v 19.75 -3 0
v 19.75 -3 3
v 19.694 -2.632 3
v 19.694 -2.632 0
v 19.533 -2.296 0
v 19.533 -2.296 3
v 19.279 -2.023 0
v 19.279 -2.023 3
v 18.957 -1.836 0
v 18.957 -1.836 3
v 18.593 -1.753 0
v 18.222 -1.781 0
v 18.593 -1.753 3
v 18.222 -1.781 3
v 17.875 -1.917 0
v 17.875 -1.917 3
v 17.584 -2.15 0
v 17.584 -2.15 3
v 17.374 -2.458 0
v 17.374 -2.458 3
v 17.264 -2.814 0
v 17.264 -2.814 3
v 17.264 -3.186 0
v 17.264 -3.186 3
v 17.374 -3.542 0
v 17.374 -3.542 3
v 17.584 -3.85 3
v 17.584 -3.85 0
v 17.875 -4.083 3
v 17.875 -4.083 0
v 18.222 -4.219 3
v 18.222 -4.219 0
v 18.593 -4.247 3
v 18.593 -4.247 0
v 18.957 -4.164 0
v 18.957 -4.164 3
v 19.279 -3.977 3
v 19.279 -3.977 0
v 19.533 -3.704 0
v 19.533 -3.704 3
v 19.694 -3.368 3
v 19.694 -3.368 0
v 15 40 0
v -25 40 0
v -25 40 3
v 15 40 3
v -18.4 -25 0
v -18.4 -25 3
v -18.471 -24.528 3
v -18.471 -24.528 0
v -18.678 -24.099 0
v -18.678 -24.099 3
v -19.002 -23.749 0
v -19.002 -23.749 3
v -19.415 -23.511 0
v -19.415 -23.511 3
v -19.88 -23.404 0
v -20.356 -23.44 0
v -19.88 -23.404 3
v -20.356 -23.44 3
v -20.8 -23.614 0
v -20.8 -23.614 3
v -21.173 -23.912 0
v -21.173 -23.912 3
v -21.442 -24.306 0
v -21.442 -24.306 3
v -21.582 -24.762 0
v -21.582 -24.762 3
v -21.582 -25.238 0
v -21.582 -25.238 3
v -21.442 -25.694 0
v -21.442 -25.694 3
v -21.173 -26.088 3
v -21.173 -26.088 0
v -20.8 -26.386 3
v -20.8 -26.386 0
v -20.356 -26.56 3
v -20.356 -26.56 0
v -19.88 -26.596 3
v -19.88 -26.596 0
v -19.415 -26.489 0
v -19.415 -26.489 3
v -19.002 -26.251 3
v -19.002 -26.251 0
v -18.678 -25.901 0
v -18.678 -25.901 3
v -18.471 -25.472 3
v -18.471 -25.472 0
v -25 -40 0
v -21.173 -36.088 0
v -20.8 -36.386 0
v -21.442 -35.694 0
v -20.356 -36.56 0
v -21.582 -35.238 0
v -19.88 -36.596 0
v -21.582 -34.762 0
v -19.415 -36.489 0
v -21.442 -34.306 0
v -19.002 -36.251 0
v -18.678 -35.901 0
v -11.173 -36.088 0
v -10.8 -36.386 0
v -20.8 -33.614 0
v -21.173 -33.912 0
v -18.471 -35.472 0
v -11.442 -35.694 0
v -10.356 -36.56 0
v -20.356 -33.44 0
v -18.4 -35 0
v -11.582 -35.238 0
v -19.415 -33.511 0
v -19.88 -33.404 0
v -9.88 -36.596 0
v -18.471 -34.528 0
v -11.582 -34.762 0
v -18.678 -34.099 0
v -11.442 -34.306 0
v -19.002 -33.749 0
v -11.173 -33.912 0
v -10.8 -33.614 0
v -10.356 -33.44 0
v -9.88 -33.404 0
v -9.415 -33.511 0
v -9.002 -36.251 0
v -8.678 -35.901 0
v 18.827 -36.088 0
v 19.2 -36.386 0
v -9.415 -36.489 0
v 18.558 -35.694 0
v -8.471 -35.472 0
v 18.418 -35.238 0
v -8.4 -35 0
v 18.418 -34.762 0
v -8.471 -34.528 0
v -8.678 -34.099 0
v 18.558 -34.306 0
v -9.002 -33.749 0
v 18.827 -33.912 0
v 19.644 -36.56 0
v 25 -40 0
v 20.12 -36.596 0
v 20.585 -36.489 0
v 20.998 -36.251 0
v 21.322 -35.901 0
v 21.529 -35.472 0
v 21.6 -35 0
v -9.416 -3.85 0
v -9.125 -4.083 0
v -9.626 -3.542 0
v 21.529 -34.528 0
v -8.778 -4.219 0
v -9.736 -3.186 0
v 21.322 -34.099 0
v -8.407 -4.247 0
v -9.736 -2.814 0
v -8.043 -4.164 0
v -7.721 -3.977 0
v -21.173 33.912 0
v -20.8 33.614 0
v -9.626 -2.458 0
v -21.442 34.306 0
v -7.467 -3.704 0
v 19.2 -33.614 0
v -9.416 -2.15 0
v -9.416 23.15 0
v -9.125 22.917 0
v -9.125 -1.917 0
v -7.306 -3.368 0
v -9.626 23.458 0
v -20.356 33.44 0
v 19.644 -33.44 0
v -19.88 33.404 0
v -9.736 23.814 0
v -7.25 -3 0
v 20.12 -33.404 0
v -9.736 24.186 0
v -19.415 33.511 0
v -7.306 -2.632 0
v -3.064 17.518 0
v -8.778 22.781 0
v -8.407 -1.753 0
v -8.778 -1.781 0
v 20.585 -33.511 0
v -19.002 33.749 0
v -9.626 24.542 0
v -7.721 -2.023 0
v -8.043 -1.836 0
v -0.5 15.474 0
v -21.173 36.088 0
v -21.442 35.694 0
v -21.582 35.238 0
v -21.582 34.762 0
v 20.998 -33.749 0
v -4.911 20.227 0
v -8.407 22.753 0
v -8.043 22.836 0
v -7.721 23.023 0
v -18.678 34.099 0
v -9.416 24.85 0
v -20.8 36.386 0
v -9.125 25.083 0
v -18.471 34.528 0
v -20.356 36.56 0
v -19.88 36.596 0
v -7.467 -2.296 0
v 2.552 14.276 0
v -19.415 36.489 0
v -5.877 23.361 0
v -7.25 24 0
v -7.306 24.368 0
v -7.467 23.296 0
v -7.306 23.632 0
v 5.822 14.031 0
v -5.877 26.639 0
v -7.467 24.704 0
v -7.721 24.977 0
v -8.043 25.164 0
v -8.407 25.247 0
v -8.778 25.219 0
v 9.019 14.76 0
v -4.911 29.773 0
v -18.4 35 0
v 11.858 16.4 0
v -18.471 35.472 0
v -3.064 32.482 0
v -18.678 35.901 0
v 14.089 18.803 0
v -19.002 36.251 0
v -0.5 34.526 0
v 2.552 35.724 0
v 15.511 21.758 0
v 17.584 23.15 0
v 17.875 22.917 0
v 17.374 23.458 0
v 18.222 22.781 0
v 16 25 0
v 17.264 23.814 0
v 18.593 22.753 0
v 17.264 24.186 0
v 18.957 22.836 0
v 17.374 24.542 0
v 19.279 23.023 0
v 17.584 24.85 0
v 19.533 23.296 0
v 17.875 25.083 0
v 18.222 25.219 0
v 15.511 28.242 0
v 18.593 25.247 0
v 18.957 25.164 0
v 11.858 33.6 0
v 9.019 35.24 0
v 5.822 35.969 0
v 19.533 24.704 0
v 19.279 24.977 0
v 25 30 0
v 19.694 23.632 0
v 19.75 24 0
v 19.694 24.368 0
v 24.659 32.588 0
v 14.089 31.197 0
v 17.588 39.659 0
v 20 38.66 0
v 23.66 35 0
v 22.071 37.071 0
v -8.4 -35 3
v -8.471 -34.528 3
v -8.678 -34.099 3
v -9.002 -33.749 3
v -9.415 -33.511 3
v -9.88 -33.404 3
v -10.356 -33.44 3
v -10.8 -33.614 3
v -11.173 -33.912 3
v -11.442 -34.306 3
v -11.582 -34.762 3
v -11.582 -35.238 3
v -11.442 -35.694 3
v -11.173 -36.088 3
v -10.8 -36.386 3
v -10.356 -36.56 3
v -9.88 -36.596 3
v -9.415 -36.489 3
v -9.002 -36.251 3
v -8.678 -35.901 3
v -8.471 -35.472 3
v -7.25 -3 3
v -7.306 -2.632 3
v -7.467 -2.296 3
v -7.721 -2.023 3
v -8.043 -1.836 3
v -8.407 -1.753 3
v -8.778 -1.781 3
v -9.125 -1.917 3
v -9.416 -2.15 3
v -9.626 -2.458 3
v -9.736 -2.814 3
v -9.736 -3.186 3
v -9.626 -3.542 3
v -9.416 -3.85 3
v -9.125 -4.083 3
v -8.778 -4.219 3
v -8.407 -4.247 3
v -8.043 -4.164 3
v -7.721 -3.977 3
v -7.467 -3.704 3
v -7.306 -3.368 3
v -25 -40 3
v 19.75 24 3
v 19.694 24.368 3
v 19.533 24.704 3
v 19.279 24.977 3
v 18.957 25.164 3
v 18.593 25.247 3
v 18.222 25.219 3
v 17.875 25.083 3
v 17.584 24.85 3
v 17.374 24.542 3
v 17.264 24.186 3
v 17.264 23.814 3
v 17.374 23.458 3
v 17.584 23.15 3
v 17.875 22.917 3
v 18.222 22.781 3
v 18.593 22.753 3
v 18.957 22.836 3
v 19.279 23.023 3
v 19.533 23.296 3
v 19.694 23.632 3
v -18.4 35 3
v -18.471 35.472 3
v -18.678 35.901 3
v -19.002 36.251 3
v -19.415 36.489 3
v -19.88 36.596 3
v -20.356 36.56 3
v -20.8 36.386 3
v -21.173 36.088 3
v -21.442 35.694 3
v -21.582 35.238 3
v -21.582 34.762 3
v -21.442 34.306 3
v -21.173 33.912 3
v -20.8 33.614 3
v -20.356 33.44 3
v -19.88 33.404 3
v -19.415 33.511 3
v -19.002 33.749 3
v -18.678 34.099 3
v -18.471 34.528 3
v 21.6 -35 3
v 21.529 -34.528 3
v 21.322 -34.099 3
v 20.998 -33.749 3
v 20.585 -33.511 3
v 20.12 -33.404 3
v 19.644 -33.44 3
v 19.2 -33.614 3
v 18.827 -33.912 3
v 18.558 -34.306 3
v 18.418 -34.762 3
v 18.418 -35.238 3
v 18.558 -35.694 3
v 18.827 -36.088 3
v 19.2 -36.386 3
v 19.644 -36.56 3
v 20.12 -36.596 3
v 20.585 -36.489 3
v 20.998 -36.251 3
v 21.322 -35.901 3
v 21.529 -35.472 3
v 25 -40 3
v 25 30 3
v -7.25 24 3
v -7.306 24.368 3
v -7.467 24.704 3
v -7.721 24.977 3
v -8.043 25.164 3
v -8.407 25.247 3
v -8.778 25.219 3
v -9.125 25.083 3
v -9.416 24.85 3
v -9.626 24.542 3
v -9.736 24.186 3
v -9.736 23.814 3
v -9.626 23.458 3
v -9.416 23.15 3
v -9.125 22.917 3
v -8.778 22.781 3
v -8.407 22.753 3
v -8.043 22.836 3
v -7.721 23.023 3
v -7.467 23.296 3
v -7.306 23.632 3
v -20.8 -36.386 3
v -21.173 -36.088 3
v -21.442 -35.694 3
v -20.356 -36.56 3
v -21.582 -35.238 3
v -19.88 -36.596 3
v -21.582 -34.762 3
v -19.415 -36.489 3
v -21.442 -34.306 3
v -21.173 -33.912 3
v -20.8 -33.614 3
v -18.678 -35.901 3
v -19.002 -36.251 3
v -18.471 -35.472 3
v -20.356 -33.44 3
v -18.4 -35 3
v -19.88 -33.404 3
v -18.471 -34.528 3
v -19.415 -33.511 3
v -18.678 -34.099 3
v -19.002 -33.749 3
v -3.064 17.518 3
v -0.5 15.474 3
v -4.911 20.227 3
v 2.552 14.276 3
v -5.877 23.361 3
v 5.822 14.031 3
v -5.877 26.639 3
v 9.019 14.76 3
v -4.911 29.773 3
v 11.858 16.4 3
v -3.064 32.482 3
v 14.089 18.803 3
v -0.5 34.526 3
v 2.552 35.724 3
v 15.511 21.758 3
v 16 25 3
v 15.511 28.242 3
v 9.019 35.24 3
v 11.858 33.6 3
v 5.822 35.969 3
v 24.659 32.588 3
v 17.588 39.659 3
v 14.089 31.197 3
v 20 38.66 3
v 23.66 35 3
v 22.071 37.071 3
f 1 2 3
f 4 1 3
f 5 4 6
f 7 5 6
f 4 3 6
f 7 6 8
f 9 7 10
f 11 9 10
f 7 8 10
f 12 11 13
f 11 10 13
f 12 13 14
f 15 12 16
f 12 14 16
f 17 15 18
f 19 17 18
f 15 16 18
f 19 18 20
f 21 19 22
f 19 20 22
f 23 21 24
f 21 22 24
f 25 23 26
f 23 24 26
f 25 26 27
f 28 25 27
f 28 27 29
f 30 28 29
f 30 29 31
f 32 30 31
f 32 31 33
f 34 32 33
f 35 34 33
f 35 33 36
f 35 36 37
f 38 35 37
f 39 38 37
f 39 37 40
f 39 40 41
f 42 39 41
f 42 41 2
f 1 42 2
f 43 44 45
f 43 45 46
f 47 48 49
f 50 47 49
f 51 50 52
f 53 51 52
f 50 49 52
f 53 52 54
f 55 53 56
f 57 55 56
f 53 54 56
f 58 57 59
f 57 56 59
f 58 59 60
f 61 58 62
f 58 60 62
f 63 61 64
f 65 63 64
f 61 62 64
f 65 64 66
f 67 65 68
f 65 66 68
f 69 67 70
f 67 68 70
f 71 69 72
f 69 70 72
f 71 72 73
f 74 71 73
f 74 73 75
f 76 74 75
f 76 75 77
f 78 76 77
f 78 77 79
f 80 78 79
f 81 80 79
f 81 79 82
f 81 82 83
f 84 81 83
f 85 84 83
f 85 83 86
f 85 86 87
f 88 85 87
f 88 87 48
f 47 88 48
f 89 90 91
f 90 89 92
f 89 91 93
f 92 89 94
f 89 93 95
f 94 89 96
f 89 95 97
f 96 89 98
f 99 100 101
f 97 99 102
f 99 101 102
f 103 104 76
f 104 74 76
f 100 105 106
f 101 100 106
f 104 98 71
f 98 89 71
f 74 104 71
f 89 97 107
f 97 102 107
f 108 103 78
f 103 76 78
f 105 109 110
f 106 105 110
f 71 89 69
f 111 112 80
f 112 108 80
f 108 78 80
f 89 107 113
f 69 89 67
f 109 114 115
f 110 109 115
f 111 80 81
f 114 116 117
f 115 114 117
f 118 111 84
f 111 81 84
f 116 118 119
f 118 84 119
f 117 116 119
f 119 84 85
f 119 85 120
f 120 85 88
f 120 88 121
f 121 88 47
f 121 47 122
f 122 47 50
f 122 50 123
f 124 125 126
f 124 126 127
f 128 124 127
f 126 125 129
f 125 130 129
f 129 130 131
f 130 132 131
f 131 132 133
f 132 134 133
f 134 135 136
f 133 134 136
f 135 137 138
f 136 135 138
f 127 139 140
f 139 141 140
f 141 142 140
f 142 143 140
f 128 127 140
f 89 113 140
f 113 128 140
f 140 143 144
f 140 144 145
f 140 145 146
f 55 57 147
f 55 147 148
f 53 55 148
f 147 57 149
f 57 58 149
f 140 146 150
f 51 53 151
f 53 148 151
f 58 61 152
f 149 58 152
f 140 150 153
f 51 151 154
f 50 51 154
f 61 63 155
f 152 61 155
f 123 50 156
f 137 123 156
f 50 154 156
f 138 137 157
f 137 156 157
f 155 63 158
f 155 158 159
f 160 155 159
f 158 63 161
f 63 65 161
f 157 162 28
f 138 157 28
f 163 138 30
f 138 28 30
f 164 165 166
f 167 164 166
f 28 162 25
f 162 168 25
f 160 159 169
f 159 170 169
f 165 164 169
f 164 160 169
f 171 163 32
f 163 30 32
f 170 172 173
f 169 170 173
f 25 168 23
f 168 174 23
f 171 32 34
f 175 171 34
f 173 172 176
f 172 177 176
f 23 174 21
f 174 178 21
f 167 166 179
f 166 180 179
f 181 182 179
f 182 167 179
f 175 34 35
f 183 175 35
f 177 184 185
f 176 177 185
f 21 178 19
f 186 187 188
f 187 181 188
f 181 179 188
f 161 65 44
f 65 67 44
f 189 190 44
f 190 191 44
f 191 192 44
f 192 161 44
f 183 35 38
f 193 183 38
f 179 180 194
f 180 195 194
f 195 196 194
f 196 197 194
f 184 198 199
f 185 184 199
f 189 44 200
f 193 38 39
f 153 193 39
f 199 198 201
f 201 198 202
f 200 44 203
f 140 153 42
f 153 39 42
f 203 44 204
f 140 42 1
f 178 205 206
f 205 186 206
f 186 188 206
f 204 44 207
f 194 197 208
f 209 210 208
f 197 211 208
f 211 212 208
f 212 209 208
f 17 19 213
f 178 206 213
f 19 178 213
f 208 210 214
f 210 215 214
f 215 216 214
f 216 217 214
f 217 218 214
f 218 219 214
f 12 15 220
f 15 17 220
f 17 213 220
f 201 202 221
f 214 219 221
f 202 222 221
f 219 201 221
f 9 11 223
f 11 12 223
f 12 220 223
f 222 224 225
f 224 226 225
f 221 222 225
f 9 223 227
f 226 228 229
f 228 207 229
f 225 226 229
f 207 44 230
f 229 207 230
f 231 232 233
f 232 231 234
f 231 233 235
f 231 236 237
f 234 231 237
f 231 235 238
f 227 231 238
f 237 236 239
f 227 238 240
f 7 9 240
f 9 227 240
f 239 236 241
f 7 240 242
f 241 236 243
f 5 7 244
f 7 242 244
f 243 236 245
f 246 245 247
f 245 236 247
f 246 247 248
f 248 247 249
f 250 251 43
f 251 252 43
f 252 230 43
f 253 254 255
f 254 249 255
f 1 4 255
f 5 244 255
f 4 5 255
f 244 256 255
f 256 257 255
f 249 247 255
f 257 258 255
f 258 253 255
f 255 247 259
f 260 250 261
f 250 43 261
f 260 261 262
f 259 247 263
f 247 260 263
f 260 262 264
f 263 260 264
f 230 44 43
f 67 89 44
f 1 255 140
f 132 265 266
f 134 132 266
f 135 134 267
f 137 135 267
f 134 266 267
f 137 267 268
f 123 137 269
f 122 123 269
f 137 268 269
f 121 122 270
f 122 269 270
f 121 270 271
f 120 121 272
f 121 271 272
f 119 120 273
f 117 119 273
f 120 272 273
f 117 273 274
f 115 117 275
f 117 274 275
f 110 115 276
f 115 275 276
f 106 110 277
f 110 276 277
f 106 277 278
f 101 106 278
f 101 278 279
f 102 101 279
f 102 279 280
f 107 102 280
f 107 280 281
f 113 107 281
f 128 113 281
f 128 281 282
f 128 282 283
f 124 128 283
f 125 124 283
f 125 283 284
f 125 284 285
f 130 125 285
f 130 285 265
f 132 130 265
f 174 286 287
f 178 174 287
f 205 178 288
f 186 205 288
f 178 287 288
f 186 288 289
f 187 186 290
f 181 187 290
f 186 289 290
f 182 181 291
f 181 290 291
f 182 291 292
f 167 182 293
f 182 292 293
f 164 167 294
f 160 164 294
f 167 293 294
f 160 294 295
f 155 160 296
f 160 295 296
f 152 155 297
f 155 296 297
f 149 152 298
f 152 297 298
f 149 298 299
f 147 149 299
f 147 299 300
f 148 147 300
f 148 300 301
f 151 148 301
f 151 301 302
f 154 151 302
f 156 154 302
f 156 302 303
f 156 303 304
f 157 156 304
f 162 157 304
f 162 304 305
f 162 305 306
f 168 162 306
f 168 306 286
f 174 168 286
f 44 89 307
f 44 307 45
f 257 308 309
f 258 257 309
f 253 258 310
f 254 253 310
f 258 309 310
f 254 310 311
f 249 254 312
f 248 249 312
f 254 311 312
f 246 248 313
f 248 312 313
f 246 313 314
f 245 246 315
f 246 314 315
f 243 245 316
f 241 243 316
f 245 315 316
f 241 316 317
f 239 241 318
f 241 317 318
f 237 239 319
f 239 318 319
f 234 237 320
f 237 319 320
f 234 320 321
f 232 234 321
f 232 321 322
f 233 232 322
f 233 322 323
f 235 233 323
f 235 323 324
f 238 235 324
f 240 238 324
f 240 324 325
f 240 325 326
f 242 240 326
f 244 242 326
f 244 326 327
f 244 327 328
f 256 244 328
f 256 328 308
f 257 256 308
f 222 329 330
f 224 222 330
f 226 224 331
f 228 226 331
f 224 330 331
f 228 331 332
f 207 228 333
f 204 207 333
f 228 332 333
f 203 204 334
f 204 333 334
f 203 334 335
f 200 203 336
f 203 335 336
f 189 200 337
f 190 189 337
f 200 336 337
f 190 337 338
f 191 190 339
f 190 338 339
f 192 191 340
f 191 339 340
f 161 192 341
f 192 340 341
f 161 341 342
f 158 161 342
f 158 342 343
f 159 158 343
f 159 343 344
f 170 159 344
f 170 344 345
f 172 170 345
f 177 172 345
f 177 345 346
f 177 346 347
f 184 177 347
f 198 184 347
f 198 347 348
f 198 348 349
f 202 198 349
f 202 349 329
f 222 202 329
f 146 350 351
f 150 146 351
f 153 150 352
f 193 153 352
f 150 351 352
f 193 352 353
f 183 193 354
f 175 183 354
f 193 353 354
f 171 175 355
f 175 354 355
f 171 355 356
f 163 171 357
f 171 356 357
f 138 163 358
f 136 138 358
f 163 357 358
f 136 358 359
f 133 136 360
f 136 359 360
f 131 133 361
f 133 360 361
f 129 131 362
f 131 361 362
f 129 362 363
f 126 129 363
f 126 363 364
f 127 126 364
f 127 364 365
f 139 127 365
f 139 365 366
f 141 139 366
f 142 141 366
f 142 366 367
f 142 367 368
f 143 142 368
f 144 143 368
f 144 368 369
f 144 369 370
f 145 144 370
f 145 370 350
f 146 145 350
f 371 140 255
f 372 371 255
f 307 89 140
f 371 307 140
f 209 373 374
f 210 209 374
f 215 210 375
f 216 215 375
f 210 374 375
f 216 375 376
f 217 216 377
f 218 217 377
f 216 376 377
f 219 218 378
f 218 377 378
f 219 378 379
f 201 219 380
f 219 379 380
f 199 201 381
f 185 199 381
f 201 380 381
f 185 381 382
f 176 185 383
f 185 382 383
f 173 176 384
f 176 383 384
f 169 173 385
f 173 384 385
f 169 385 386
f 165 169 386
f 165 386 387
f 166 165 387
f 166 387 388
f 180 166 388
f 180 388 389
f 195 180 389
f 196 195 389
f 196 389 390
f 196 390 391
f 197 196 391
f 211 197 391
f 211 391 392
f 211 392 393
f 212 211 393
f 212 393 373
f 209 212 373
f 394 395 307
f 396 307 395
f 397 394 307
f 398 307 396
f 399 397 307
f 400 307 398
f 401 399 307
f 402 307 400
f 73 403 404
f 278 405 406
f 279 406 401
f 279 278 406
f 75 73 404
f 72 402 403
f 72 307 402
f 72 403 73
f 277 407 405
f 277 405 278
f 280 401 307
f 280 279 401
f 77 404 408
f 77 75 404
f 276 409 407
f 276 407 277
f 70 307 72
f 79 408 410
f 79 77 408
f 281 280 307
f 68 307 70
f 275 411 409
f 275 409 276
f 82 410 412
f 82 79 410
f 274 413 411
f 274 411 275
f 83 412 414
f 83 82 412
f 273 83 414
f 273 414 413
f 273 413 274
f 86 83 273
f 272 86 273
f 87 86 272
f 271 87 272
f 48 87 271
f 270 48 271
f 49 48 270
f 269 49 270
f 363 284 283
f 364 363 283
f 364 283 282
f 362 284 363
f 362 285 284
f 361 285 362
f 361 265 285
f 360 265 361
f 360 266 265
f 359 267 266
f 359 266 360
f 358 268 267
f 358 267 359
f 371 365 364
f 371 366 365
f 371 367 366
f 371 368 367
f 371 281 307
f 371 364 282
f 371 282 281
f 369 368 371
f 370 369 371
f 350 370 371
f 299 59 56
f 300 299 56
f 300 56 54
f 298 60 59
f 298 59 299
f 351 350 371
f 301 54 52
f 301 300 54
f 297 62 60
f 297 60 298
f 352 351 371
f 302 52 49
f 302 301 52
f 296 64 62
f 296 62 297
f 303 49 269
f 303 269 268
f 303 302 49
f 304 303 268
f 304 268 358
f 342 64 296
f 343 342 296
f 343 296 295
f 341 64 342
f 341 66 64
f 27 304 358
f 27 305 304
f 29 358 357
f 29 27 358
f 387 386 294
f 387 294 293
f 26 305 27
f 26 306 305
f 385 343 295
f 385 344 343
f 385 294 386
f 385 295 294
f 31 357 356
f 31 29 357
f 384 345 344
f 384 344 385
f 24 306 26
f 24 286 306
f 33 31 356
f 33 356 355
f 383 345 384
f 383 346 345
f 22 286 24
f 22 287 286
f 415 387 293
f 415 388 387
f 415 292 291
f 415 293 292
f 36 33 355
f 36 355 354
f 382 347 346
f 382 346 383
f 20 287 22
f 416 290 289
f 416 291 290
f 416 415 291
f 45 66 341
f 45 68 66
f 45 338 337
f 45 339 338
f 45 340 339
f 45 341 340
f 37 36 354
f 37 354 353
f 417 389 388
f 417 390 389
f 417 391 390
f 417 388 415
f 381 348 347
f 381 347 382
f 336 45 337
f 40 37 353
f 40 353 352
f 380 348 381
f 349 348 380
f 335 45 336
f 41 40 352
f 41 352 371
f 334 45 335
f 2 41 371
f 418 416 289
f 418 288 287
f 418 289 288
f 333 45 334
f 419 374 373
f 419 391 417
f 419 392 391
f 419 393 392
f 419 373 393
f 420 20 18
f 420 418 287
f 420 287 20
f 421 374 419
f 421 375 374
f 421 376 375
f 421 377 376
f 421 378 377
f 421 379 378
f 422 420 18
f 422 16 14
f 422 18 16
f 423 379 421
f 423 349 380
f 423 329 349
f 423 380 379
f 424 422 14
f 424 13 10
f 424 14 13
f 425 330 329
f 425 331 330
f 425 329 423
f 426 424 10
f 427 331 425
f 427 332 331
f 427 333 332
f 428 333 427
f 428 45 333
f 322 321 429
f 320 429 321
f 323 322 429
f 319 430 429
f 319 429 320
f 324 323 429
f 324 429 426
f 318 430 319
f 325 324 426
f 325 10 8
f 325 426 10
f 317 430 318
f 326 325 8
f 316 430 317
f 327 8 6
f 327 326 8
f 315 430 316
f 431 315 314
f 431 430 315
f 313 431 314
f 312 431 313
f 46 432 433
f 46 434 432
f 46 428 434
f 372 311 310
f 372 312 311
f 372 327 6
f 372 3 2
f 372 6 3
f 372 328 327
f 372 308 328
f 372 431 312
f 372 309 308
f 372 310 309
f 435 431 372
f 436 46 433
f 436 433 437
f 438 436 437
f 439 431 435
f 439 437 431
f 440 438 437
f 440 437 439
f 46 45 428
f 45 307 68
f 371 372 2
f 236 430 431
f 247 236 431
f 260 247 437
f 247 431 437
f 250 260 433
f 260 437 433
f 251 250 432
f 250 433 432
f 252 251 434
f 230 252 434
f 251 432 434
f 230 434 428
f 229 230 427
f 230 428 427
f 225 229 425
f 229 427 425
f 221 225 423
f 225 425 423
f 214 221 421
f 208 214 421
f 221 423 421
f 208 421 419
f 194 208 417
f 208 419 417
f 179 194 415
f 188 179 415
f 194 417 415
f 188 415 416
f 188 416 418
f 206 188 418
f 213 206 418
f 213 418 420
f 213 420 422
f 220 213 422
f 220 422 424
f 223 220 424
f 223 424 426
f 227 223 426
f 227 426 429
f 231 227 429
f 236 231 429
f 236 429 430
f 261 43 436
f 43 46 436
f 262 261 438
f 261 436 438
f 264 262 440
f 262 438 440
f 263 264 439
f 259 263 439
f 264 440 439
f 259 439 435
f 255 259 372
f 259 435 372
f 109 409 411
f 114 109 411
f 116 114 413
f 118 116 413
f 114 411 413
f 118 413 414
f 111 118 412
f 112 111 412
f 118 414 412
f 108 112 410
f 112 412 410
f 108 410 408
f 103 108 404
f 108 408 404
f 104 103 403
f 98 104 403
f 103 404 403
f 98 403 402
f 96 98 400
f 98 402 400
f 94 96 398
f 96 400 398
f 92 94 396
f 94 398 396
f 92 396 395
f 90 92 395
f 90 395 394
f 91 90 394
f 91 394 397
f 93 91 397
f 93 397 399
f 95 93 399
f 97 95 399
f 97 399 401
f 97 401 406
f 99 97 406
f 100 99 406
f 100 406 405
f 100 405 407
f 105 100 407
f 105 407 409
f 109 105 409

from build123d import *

# Parameters (mm, degrees)
SKETCH_1_W          = 50
SKETCH_1_H          = 80
EXTRUDE_1_DEPTH     = 3
SKETCH_2_R          = 11
SKETCH_2_R_2        = 1.25
SKETCH_2_R_3        = 1.6
CUT_EXTRUDE_1_DEPTH = 48.265209192
FILLET_1_R          = 10


with BuildPart() as part:
    # ｽｹｯﾁ1 → ﾎﾞｽ - 押し出し1 (new body)
    with BuildSketch(Plane.XY):
        Rectangle(SKETCH_1_W, SKETCH_1_H)
    extrude(amount=EXTRUDE_1_DEPTH)

    # ｽｹｯﾁ2 → ｶｯﾄ - 押し出し1 (cut, through all)
    with BuildSketch(Plane.XY.offset(3)):
        with Locations((5, 25)):
            Circle(SKETCH_2_R)
        with Locations((18.5, 24)):
            Circle(SKETCH_2_R_2)
        with Locations((-20, 35)):
            Circle(SKETCH_2_R_3)
        with Locations((-20, -25)):
            Circle(SKETCH_2_R_3)
        with Locations((-8.5, 24)):
            Circle(SKETCH_2_R_2)
        with Locations((18.5, -3)):
            Circle(SKETCH_2_R_2)
        with Locations((-20, -35)):
            Circle(SKETCH_2_R_3)
        with Locations((-10, -35)):
            Circle(SKETCH_2_R_3)
        with Locations((20, -35)):
            Circle(SKETCH_2_R_3)
        with Locations((-8.5, -3)):
            Circle(SKETCH_2_R_2)
    extrude(amount=-CUT_EXTRUDE_1_DEPTH, mode=Mode.SUBTRACT)

    # ﾌｨﾚｯﾄ1
    fillet_1_edges = [part.edges().sort_by_distance(p)[0] for p in [
        (25, 40, 1.5),
    ]]
    fillet(fillet_1_edges, radius=FILLET_1_R)


solid = part.part
